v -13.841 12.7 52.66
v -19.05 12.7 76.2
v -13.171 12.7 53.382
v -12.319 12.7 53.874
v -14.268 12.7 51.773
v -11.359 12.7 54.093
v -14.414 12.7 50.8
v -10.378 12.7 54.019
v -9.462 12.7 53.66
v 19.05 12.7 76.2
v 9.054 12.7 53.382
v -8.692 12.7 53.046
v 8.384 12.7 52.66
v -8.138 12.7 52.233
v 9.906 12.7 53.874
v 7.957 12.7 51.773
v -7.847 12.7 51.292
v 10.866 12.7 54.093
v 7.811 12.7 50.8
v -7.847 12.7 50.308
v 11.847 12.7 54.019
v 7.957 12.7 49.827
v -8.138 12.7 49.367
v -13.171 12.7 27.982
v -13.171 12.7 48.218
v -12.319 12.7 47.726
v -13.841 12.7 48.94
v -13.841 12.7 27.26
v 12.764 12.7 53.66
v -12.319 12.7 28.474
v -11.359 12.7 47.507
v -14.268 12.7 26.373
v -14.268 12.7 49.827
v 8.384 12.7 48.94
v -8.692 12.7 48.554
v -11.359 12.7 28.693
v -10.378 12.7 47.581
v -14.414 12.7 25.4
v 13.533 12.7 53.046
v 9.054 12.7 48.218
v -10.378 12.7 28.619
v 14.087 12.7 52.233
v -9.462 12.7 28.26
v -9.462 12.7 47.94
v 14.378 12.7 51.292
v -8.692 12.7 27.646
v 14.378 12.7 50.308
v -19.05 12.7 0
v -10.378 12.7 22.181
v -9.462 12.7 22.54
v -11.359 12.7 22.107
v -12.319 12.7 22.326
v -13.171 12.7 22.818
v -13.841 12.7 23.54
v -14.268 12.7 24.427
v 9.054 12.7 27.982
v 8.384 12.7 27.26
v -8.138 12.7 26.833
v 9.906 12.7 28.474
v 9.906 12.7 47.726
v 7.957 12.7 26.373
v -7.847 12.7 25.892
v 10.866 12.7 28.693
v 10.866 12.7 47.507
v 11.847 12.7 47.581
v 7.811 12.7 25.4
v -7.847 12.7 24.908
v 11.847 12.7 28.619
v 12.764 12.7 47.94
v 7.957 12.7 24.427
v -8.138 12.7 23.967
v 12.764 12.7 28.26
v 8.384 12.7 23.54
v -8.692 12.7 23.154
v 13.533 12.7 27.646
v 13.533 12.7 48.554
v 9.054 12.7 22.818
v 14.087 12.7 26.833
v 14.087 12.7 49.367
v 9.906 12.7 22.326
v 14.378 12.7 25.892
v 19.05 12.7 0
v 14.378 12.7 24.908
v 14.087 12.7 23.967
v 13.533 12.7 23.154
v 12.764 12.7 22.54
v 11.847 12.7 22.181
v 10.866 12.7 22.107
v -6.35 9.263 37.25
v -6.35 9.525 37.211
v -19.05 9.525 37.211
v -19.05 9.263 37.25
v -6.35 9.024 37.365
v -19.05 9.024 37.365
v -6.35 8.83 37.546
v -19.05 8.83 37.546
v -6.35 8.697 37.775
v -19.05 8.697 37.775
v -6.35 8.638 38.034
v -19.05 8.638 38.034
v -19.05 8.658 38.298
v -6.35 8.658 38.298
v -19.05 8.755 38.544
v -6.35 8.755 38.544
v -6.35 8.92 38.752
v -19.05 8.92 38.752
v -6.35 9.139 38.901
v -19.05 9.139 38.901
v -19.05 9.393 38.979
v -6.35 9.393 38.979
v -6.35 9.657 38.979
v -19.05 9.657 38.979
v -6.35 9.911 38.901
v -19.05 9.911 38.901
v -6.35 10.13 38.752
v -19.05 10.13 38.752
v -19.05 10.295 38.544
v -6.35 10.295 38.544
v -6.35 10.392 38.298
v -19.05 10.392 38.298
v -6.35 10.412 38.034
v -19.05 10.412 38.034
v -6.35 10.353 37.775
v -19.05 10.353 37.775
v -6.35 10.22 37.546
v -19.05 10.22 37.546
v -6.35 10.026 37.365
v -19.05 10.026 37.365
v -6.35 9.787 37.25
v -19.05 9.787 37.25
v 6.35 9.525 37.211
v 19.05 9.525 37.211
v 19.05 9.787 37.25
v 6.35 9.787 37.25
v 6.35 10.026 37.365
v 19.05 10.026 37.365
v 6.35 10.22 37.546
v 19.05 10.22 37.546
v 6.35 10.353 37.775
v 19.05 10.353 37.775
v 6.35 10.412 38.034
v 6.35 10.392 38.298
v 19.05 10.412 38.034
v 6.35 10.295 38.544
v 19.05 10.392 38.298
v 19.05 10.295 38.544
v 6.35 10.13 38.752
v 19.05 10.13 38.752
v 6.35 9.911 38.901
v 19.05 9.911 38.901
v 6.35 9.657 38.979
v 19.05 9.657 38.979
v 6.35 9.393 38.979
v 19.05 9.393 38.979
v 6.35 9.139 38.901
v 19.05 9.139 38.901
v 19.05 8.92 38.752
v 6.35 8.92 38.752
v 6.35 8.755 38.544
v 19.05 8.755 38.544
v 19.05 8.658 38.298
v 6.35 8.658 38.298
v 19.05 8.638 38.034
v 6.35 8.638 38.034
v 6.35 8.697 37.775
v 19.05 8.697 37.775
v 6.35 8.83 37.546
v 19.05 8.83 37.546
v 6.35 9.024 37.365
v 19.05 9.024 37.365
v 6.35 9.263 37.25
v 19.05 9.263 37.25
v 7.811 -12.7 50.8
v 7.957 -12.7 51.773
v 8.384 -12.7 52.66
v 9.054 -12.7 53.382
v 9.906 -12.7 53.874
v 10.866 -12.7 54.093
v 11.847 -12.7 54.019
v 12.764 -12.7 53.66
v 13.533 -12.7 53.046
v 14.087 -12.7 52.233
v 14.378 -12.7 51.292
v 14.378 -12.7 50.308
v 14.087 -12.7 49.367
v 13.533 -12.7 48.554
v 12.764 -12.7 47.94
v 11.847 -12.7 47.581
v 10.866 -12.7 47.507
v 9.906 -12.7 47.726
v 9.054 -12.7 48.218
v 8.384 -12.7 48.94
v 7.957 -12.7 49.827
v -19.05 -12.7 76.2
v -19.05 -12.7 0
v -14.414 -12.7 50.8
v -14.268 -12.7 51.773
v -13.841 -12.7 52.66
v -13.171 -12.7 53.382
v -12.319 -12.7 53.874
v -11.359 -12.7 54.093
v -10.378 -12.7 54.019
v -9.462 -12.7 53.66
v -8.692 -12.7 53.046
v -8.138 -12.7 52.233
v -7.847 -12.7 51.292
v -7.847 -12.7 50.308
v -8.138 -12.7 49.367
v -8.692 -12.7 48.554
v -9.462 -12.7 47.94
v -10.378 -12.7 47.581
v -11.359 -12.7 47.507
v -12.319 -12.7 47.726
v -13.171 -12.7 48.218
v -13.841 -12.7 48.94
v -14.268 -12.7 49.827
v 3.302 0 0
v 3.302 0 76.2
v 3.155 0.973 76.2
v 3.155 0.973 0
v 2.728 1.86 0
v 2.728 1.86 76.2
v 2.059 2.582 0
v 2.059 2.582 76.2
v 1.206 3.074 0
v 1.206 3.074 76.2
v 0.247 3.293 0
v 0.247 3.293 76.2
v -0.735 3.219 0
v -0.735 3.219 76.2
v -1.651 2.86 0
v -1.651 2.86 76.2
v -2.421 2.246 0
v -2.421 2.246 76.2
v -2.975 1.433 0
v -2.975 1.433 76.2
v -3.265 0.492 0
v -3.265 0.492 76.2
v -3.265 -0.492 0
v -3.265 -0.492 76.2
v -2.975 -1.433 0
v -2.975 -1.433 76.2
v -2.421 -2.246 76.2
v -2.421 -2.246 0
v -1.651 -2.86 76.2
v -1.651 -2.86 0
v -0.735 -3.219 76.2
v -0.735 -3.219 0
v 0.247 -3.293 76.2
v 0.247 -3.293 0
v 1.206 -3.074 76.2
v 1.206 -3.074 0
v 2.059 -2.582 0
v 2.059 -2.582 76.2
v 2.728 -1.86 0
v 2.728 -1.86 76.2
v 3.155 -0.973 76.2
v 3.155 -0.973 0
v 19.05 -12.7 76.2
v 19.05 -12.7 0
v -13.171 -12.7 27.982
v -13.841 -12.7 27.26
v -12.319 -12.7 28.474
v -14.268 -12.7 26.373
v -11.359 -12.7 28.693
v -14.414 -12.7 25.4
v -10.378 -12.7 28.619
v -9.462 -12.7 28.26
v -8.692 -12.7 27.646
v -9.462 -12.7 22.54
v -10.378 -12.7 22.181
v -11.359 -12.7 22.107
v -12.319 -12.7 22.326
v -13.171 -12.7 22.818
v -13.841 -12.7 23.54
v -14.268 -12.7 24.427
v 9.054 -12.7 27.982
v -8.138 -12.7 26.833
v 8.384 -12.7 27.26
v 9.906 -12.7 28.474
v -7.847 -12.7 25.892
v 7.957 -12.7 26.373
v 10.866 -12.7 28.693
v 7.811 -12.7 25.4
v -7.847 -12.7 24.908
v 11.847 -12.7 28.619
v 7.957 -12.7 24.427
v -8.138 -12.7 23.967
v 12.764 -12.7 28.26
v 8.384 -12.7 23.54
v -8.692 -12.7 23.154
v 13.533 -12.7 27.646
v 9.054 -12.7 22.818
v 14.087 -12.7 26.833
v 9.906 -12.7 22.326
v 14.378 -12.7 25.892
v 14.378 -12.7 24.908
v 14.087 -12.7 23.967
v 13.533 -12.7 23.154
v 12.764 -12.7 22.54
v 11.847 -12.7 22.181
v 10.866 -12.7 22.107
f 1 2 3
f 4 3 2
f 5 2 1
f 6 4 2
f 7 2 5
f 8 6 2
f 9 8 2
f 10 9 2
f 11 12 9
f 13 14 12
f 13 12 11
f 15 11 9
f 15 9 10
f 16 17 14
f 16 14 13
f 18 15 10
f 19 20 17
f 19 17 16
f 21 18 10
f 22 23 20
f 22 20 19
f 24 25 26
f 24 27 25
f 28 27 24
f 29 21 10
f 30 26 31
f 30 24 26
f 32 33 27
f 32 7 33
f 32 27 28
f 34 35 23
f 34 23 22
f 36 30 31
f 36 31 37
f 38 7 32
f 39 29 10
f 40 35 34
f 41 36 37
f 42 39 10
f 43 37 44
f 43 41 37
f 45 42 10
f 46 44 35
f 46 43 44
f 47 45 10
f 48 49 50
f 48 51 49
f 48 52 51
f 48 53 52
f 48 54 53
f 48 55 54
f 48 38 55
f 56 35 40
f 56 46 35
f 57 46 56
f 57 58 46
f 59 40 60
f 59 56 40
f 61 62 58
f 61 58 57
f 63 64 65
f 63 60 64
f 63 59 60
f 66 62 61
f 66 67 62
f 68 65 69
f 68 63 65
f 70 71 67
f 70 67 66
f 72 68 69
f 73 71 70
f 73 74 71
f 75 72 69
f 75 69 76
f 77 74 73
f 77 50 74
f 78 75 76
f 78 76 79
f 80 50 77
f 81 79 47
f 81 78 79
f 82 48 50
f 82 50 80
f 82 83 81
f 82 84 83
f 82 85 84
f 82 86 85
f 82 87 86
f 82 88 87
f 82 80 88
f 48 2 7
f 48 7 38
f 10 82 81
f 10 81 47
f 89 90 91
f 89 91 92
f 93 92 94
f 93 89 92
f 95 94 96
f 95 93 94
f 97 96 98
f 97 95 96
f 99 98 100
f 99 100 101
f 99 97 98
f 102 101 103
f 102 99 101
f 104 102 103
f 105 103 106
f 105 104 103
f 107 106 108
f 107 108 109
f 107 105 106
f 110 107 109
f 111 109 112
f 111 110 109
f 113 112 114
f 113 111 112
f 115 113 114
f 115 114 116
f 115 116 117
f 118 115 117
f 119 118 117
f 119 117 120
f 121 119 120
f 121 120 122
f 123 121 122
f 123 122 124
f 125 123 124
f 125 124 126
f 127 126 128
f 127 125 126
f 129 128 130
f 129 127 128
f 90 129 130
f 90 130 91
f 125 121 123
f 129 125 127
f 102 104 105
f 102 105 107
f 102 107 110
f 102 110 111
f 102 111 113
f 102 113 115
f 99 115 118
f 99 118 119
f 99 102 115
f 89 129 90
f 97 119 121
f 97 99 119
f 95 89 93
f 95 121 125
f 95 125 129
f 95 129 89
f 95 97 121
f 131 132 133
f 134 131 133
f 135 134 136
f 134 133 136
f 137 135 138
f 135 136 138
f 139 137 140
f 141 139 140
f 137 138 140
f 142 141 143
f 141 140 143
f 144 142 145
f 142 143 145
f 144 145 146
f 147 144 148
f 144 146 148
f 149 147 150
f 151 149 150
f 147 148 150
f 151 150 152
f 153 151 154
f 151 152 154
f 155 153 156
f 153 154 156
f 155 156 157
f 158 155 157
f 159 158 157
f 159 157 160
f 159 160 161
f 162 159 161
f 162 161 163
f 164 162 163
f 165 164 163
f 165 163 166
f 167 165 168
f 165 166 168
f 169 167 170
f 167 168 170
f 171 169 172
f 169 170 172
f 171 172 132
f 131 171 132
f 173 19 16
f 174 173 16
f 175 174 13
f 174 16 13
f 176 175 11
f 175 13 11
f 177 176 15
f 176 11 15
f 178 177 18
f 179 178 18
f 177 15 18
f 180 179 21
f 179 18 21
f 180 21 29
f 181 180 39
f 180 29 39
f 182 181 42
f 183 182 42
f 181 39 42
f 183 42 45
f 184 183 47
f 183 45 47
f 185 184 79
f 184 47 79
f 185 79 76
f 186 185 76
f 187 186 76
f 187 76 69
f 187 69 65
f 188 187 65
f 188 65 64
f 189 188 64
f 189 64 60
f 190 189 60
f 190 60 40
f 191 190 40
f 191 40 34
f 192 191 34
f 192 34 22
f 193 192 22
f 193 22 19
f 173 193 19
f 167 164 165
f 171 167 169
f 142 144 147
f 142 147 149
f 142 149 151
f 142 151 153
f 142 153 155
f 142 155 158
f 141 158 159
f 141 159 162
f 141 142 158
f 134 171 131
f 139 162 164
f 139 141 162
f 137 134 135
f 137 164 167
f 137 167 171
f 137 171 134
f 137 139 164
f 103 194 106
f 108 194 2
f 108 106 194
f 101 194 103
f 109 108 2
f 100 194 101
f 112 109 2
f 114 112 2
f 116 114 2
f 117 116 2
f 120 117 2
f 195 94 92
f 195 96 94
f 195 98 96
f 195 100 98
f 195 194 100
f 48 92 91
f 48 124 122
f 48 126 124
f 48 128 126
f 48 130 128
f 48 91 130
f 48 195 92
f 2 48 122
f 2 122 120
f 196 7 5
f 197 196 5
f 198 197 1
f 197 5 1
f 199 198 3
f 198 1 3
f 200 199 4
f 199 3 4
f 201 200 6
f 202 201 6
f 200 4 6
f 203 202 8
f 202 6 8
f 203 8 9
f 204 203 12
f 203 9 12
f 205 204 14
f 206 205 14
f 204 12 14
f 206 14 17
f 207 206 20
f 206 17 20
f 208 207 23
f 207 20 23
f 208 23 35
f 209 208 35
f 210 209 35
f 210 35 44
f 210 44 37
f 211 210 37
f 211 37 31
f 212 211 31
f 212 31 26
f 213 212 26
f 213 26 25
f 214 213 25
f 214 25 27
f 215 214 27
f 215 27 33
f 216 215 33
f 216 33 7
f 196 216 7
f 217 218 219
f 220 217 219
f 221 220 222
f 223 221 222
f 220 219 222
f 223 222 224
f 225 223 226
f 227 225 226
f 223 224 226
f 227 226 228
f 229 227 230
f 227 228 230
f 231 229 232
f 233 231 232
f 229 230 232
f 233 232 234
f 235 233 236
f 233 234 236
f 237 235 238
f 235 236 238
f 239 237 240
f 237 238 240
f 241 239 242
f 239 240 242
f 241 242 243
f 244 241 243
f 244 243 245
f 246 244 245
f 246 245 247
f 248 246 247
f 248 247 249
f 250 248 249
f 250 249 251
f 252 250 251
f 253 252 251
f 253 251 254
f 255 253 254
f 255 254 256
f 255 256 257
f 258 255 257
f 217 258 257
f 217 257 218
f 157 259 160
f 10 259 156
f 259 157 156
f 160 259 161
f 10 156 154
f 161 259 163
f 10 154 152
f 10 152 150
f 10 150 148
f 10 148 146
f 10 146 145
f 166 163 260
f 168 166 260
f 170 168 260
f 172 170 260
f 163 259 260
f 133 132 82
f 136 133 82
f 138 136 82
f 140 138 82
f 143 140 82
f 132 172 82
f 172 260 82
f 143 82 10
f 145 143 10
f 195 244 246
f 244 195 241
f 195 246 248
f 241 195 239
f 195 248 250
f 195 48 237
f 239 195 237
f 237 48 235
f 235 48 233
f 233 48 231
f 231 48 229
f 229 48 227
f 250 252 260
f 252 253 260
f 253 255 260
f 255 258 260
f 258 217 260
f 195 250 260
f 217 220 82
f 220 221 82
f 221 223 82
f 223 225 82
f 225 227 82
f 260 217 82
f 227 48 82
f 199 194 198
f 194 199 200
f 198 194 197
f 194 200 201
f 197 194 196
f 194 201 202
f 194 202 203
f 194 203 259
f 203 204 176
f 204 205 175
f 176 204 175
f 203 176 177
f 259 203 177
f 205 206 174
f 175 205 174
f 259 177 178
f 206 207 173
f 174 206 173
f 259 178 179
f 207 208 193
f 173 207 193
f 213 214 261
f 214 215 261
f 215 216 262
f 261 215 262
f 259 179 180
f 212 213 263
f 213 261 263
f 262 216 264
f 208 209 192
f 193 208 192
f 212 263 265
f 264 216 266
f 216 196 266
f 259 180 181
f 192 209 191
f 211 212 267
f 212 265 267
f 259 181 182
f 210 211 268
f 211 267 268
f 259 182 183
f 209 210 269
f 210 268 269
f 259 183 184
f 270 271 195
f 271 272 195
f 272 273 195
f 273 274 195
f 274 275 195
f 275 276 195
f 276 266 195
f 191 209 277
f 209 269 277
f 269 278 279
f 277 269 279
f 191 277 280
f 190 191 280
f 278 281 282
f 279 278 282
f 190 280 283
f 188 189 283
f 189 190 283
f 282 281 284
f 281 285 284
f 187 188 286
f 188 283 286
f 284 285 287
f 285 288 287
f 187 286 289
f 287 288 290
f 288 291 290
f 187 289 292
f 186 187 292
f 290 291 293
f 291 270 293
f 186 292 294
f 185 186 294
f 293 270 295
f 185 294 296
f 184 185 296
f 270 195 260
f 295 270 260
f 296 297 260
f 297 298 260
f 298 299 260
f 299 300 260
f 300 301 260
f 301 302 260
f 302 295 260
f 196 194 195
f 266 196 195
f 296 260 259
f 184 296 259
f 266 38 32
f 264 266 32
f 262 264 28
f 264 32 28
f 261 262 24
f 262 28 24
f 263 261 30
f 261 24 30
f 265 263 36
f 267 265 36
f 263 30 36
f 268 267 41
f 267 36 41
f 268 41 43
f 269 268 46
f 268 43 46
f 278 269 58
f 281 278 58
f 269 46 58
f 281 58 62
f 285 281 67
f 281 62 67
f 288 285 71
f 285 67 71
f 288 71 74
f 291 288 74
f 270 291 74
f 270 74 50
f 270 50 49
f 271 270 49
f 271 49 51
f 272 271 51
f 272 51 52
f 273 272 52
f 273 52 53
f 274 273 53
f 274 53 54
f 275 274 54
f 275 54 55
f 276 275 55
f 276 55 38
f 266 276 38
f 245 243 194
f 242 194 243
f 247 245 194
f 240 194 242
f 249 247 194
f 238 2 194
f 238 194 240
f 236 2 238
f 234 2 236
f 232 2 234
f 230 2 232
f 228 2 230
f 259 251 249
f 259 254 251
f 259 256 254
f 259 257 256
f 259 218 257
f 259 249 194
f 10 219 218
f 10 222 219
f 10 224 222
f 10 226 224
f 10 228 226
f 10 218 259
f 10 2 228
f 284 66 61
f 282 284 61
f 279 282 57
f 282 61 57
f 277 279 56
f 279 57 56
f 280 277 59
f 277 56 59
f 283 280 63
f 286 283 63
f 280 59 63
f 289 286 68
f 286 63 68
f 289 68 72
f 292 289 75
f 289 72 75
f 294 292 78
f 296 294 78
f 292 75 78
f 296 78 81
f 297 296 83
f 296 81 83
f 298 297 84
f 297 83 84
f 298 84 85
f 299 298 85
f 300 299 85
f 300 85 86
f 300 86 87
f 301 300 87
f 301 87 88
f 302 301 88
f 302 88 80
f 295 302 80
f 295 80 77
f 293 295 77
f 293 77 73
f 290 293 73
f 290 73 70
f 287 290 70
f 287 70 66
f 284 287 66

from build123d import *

# Parameters (mm, degrees)
SKETCH1_W           = 38.1
SKETCH1_H           = 25.4
BOSS_EXTRUDE1_DEPTH = 76.2
SKETCH2_R           = 3.302
CUT_EXTRUDE1_DEPTH  = 80.565271947
SKETCH3_R           = 3.302
CUT_EXTRUDE2_DEPTH  = 83.55
SKETCH5_R           = 0.889
CUT_EXTRUDE3_DEPTH  = 12.7
CUT_EXTRUDE4_START  = -12.7
SKETCH6_R           = 0.889
CUT_EXTRUDE4_DEPTH  = 12.7


with BuildPart() as part:
    # Sketch1 → Boss-Extrude1 (new body)
    with BuildSketch(Plane.XY):
        Rectangle(SKETCH1_W, SKETCH1_H)
    extrude(amount=BOSS_EXTRUDE1_DEPTH)

    # Sketch2 → Cut-Extrude1 (cut, through all)
    with BuildSketch(Plane.XY.offset(76.2)):
        Circle(SKETCH2_R)
    extrude(amount=-CUT_EXTRUDE1_DEPTH, mode=Mode.SUBTRACT)

    # Sketch3 → Cut-Extrude2 (cut, through all)
    with BuildSketch(Plane(origin=(0, 12.7, 0), x_dir=(1, 0, 0), z_dir=(0, 1, 0))):
        with Locations(Location((-11.1125, -25.4, 0), (0, 0, 180))):
            Circle(SKETCH3_R)
        with Locations(Location((11.1125, -25.4, 0), (0, 0, 180))):
            Circle(SKETCH3_R)
        with Locations(Location((-11.1125, -50.8, 0), (0, 0, 180))):
            Circle(SKETCH3_R)
        with Locations(Location((11.1125, -50.8, 0), (0, 0, 180))):
            Circle(SKETCH3_R)
    extrude(amount=-CUT_EXTRUDE2_DEPTH, mode=Mode.SUBTRACT)

    # Sketch5 → Cut-Extrude3 (cut)
    with BuildSketch(Plane(origin=(19.05, 0, 0), x_dir=(0, 0, -1), z_dir=(1, 0, 0))):
        with Locations((-38.1, 9.525)):
            Circle(SKETCH5_R)
    extrude(amount=-CUT_EXTRUDE3_DEPTH, mode=Mode.SUBTRACT)

    # Sketch6 → Cut-Extrude4 (cut)
    with BuildSketch(Plane.ZY.offset(19.05).offset(CUT_EXTRUDE4_START)):
        with Locations(Location((38.1, 9.525, 0), (0, 0, 180))):
            Circle(SKETCH6_R)
    extrude(amount=CUT_EXTRUDE4_DEPTH, mode=Mode.SUBTRACT)


solid = part.part
